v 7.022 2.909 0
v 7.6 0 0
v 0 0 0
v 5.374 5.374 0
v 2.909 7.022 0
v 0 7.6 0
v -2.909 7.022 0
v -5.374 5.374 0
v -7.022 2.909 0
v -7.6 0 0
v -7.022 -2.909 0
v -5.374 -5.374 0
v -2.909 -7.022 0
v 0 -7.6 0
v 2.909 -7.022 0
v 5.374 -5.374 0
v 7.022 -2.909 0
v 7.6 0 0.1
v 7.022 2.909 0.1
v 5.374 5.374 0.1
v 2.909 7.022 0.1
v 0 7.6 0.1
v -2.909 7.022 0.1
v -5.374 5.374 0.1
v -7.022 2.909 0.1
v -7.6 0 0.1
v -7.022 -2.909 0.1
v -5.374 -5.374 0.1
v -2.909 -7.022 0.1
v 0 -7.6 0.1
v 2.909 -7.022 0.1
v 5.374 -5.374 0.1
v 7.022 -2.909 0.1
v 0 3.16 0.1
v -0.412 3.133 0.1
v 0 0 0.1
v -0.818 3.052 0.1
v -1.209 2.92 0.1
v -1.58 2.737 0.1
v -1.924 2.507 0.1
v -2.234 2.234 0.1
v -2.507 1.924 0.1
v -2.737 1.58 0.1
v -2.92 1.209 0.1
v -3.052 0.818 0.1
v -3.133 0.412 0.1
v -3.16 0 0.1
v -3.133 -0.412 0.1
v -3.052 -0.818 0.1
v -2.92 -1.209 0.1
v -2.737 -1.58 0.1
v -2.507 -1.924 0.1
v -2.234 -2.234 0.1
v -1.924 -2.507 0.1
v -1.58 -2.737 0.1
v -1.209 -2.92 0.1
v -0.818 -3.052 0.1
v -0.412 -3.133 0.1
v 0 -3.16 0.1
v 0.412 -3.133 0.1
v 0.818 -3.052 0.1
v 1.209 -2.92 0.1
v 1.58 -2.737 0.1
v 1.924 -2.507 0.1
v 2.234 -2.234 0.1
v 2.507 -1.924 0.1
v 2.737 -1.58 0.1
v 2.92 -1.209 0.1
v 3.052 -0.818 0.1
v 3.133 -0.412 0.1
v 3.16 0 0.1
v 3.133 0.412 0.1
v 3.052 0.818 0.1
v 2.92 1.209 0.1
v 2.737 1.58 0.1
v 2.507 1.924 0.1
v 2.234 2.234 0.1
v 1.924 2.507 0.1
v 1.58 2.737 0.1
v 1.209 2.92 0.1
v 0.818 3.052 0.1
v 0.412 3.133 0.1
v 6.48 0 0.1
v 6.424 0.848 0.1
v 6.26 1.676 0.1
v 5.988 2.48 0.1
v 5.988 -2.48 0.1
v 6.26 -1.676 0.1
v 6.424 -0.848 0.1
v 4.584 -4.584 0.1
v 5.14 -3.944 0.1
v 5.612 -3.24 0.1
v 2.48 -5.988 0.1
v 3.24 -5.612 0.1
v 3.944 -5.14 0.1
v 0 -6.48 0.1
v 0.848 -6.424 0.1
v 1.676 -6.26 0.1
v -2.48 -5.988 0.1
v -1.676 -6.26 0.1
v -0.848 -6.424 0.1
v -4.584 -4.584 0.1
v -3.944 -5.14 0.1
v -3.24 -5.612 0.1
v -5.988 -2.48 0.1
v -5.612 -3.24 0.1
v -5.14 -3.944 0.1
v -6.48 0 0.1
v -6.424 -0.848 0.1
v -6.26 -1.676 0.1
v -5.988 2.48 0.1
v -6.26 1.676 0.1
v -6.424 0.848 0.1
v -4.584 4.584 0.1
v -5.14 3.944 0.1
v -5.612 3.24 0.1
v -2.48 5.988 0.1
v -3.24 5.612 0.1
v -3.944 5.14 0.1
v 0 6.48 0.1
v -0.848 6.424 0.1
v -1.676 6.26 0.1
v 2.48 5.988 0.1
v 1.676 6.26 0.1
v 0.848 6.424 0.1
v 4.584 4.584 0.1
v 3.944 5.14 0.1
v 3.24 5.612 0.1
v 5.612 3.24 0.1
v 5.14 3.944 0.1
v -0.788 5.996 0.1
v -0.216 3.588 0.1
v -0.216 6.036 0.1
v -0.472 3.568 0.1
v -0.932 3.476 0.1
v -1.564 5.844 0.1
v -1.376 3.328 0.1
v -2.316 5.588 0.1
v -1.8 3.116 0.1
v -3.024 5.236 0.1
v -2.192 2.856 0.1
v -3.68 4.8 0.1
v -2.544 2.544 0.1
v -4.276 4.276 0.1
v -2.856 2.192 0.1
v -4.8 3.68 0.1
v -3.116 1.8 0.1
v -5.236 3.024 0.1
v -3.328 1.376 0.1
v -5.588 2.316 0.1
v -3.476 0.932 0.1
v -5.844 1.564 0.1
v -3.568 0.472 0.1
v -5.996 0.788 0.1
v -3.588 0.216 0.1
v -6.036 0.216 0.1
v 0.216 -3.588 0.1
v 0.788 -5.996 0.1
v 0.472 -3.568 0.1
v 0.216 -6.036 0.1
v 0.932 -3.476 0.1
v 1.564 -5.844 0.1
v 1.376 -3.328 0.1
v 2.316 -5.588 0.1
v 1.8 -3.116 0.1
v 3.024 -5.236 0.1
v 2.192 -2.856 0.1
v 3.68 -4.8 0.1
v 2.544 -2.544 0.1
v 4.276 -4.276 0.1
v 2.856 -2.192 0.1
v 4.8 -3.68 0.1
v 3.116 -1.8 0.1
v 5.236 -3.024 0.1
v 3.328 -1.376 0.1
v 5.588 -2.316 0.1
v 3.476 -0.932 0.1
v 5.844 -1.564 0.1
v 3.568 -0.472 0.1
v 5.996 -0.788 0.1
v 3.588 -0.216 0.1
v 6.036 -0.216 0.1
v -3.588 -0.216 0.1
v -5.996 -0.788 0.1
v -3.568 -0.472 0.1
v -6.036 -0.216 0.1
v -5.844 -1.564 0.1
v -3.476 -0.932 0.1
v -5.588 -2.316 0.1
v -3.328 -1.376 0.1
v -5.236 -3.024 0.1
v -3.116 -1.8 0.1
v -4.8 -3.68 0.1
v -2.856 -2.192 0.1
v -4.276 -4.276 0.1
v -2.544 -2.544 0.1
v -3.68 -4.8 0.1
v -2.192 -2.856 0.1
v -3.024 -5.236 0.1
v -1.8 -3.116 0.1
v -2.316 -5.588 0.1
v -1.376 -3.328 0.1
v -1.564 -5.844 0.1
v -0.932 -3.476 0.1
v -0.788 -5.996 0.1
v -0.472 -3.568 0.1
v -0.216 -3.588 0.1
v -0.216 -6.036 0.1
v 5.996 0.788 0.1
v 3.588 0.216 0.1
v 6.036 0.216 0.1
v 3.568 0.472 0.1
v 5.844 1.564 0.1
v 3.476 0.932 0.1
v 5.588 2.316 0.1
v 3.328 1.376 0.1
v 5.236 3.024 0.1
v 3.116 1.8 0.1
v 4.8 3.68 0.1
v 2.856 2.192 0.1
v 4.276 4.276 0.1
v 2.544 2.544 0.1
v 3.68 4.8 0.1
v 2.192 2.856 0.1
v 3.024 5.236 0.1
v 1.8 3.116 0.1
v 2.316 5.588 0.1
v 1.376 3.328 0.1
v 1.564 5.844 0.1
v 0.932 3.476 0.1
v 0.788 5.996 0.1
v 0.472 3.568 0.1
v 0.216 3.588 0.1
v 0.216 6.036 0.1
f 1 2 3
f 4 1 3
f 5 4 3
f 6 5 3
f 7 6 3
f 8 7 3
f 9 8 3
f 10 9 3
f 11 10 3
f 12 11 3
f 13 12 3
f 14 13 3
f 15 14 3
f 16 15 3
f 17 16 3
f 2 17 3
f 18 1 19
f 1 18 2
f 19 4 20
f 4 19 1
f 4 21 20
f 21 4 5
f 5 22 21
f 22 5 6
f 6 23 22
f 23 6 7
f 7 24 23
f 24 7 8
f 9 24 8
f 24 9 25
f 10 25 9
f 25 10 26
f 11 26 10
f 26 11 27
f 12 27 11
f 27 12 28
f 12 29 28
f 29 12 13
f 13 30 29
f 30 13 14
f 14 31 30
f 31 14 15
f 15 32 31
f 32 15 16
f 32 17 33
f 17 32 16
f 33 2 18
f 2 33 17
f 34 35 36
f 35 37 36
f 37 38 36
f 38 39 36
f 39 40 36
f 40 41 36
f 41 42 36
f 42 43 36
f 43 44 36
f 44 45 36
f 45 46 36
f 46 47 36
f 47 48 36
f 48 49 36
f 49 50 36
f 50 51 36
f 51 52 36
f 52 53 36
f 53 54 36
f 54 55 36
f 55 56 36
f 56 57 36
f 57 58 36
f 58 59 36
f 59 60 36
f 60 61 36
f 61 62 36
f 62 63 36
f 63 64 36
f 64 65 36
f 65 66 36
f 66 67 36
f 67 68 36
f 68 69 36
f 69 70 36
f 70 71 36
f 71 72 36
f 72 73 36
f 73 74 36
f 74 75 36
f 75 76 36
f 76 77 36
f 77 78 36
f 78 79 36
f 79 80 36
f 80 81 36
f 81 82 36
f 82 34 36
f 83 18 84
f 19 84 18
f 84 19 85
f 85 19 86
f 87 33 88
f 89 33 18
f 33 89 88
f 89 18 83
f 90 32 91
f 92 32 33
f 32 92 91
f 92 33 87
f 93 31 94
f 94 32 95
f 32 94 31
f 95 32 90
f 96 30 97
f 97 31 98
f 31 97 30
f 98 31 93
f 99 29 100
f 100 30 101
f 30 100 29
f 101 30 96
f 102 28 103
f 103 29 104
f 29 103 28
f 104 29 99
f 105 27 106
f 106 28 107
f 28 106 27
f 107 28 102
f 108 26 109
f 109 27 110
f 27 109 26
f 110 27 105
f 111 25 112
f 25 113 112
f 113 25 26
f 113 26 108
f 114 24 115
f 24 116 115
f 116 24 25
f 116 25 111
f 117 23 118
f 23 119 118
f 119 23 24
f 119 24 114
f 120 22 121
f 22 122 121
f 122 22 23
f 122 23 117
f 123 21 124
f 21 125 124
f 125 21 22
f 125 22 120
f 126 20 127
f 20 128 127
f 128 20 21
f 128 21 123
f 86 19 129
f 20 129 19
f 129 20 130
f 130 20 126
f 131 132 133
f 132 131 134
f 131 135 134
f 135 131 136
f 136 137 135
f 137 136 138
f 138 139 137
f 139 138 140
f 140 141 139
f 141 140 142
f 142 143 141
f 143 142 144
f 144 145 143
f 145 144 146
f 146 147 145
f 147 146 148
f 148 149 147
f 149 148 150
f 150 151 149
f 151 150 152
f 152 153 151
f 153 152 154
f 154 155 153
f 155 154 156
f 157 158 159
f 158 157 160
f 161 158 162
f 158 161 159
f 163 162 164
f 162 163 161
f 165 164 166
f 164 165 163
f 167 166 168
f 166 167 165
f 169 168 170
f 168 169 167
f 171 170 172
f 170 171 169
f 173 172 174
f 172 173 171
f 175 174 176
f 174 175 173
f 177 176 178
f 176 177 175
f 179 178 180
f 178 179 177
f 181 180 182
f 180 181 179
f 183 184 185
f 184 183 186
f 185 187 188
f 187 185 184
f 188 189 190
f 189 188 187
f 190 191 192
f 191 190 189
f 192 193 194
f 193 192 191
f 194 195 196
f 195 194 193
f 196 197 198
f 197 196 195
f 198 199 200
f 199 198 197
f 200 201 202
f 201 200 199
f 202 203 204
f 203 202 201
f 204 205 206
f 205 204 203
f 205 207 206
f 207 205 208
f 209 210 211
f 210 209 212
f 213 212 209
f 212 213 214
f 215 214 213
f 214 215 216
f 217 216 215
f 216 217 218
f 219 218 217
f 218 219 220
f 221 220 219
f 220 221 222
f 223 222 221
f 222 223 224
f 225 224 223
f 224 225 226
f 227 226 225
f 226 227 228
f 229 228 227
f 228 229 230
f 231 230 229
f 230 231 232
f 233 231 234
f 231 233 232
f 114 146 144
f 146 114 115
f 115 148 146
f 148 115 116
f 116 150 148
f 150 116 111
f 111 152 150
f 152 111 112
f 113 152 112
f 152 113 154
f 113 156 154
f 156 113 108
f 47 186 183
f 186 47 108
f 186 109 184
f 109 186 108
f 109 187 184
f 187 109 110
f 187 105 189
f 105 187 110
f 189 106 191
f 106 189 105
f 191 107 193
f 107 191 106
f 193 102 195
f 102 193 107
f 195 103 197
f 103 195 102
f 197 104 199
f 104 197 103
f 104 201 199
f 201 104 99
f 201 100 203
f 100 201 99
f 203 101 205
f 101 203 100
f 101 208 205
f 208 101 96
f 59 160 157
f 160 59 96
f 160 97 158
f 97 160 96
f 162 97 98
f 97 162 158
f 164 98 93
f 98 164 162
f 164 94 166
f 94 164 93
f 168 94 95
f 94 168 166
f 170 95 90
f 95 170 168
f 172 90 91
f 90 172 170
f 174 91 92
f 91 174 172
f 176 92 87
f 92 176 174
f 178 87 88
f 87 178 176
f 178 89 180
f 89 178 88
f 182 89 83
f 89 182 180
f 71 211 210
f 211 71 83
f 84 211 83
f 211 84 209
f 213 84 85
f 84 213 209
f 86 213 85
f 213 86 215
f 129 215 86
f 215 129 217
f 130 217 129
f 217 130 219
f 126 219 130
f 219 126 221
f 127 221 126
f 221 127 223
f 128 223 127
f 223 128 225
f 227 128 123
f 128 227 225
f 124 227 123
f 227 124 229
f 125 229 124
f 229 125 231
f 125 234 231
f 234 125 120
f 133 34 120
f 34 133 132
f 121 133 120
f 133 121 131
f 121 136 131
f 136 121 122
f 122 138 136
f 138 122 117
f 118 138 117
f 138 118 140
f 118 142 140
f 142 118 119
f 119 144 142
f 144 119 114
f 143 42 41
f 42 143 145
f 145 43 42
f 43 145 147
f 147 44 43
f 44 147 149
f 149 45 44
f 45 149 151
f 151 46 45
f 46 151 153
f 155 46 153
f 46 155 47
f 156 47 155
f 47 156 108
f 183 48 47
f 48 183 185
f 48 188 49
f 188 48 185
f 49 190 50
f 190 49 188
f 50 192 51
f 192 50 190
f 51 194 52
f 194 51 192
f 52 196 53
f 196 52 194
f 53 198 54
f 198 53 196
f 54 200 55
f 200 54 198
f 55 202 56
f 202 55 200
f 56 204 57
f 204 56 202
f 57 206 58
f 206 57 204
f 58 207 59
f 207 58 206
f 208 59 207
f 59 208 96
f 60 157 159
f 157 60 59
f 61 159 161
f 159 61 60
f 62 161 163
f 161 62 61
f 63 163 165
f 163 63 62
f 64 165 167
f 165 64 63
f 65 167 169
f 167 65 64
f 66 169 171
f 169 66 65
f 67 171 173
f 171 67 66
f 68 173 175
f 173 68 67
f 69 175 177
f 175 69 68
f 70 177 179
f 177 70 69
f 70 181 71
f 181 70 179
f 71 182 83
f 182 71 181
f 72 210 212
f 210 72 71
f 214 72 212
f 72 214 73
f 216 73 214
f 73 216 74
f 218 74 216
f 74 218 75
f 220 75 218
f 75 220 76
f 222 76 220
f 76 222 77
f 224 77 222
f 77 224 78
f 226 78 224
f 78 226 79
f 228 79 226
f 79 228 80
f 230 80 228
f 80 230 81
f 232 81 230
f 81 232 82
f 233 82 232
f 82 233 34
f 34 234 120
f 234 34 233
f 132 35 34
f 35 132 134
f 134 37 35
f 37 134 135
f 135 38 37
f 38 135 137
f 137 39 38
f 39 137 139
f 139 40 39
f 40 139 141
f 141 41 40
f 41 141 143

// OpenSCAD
// file: ../p/empty.scad
use <../lib.scad>
function ldraw_lib__empty() = [
// 0 Empty
// 0 Name: empty.dat
// 0 Author: Steffen [Steffen]
// 0 !LDRAW_ORG Primitive UPDATE 2015-01
// 0 !LICENSE Licensed under CC BY 2.0 and CC BY 4.0 : see CAreadme.txt
// 
// 0 BFC CERTIFY CCW
  [0,"BFC","CERTIFY"],
  [0,"BFC","CCW"],
// 
// 0 !HISTORY 2015-10-11 [PTadmin] Official Update 2015-01
// 
// 
// 0 // Tool MLCad cannot handle really empty files. This file is used as a workaround.
// 0 // It exceptionally contains forbidden non-LDRAW standard syntax to satisfy MLCad until it is fixed OR a different editor has become the de-facto LDRAW standard.
// 0 // The line being used here is an "impossible" conditional line which never should be visible,
// 0 // additionally hidden by a syntax explicitly hiding it from displaying.
// 
// 0 MLCAD HIDE 5 24 0 0 0 0.0001 0 0 0.0001 -0.0001 0 0 0 0
];
makepoly(ldraw_lib__empty(), line=0.2);
// file: ../p/1-16chrd.scad
use <../lib.scad>
use <empty.scad>
function ldraw_lib__1_16chrd() = [
// 0 Chord 0.0625
// 0 Name: 1-16chrd.dat
// 0 Author: Philippe Hurbain [Philo]
// 0 !LDRAW_ORG Primitive UPDATE 2015-01
// 0 !LICENSE Licensed under CC BY 2.0 and CC BY 4.0 : see CAreadme.txt
// 
// 0 BFC CERTIFY CCW
  [0,"BFC","CERTIFY"],
  [0,"BFC","CCW"],
// 
// 0 !HISTORY 2015-10-11 [PTadmin] Official Update 2015-01
// 
// 
// 0 // This file is intentionally empty because at the current \P resolution,
// 0 // an 1-16chrd is actually empty. However, this file still is present
// 0 // to allow tools to do primitives substition and fill in a real chrd here,
// 0 // or, if desired, to substitute this with the hi-res 48\1-16chrd.
// 
// 0 // This file is based on an idea by Darats at http://forums.ldraw.org/read.php?19,14500,14500#msg-14500
// 
// 1 16 0 0 0 1 0 0 0 1 0 0 0 1 empty.dat
  [1,16,0,0,0,1,0,0,0,1,0,0,0,1, ldraw_lib__empty()],
];
makepoly(ldraw_lib__1_16chrd(), line=0.2);
// file: ../p/4-4disc.scad
use <../lib.scad>
function ldraw_lib__4_4disc() = [
// 0 Disc 1.0
// 0 Name: 4-4disc.dat
// 0 Author: James Jessiman
// 0 !LDRAW_ORG Primitive UPDATE 2002-02
// 0 !LICENSE Licensed under CC BY 2.0 and CC BY 4.0 : see CAreadme.txt
// 
// 0 BFC CERTIFY CCW
  [0,"BFC","CERTIFY"],
  [0,"BFC","CCW"],
// 
// 0 !HISTORY 1998-12-15 [PTadmin] Official Update 1998-10
// 0 !HISTORY 2002-03-23 [sbliss] Added BFC statement
// 0 !HISTORY 2002-04-25 [PTadmin] Official Update 2002-02
// 0 !HISTORY 2007-06-24 [PTadmin] Header formatted for Contributor Agreement
// 0 !HISTORY 2008-07-01 [PTadmin] Official Update 2008-01
// 
// 
// 3 16 0 0 0 1 0 0 0.9239 0 0.3827
  [3,16,0,0,0,1,0,0,0.9239,0,0.3827],
// 3 16 0 0 0 0.9239 0 0.3827 0.7071 0 0.7071
  [3,16,0,0,0,0.9239,0,0.3827,0.7071,0,0.7071],
// 3 16 0 0 0 0.7071 0 0.7071 0.3827 0 0.9239
  [3,16,0,0,0,0.7071,0,0.7071,0.3827,0,0.9239],
// 3 16 0 0 0 0.3827 0 0.9239 0 0 1
  [3,16,0,0,0,0.3827,0,0.9239,0,0,1],
// 3 16 0 0 0 0 0 1 -0.3827 0 0.9239
  [3,16,0,0,0,0,0,1,-0.3827,0,0.9239],
// 3 16 0 0 0 -0.3827 0 0.9239 -0.7071 0 0.7071
  [3,16,0,0,0,-0.3827,0,0.9239,-0.7071,0,0.7071],
// 3 16 0 0 0 -0.7071 0 0.7071 -0.9239 0 0.3827
  [3,16,0,0,0,-0.7071,0,0.7071,-0.9239,0,0.3827],
// 3 16 0 0 0 -0.9239 0 0.3827 -1 0 -0
  [3,16,0,0,0,-0.9239,0,0.3827,-1,0,-0],
// 3 16 0 0 0 -1 0 -0 -0.9239 0 -0.3827
  [3,16,0,0,0,-1,0,-0,-0.9239,0,-0.3827],
// 3 16 0 0 0 -0.9239 0 -0.3827 -0.7071 0 -0.7071
  [3,16,0,0,0,-0.9239,0,-0.3827,-0.7071,0,-0.7071],
// 3 16 0 0 0 -0.7071 0 -0.7071 -0.3827 0 -0.9239
  [3,16,0,0,0,-0.7071,0,-0.7071,-0.3827,0,-0.9239],
// 3 16 0 0 0 -0.3827 0 -0.9239 0 0 -1
  [3,16,0,0,0,-0.3827,0,-0.9239,0,0,-1],
// 3 16 0 0 0 0 0 -1 0.3827 0 -0.9239
  [3,16,0,0,0,0,0,-1,0.3827,0,-0.9239],
// 3 16 0 0 0 0.3827 0 -0.9239 0.7071 0 -0.7071
  [3,16,0,0,0,0.3827,0,-0.9239,0.7071,0,-0.7071],
// 3 16 0 0 0 0.7071 0 -0.7071 0.9239 0 -0.3827
  [3,16,0,0,0,0.7071,0,-0.7071,0.9239,0,-0.3827],
// 3 16 0 0 0 0.9239 0 -0.3827 1 0 0
  [3,16,0,0,0,0.9239,0,-0.3827,1,0,0],
// 0
];
makepoly(ldraw_lib__4_4disc(), line=0.2);
// file: ../p/4-4cyli.scad
use <../lib.scad>
function ldraw_lib__4_4cyli() = [
// 0 Cylinder 1.0
// 0 Name: 4-4cyli.dat
// 0 Author: James Jessiman
// 0 !LDRAW_ORG Primitive UPDATE 2005-01
// 0 !LICENSE Licensed under CC BY 2.0 and CC BY 4.0 : see CAreadme.txt
// 
// 0 BFC CERTIFY CCW
  [0,"BFC","CERTIFY"],
  [0,"BFC","CCW"],
// 
// 0 !HISTORY 1998-12-15 [PTadmin] Official Update 1998-10
// 0 !HISTORY 2002-03-23 [sbliss] Added BFC statement; merged headers from files in distributions LDraw 0.27 and Complete.
// 0 !HISTORY 2002-04-25 [PTadmin] Official Update 2002-02
// 0 !HISTORY 2004-12-14 [guyvivan] BFC CCW
// 0 !HISTORY 2005-12-28 [PTadmin] Official Update 2005-01
// 0 !HISTORY 2007-06-24 [PTadmin] Header formatted for Contributor Agreement
// 0 !HISTORY 2008-07-01 [PTadmin] Official Update 2008-01
// 
// 
// 4 16 1 1 0 0.9239 1 0.3827 0.9239 0 0.3827 1 0 0
  [4,16,1,1,0,0.9239,1,0.3827,0.9239,0,0.3827,1,0,0],
// 5 24 1 0 0 1 1 0 0.9239 0 0.3827 0.9239 0 -0.3827
  [5,24,1,0,0,1,1,0,0.9239,0,0.3827,0.9239,0,-0.3827],
// 4 16 0.9239 1 0.3827 0.7071 1 0.7071 0.7071 0 0.7071 0.9239 0 0.3827
  [4,16,0.9239,1,0.3827,0.7071,1,0.7071,0.7071,0,0.7071,0.9239,0,0.3827],
// 5 24 0.9239 0 0.3827 0.9239 1 0.3827 0.7071 0 0.7071 1 0 0
  [5,24,0.9239,0,0.3827,0.9239,1,0.3827,0.7071,0,0.7071,1,0,0],
// 4 16 0.7071 1 0.7071 0.3827 1 0.9239 0.3827 0 0.9239 0.7071 0 0.7071
  [4,16,0.7071,1,0.7071,0.3827,1,0.9239,0.3827,0,0.9239,0.7071,0,0.7071],
// 5 24 0.7071 0 0.7071 0.7071 1 0.7071 0.3827 0 0.9239 0.9239 0 0.3827
  [5,24,0.7071,0,0.7071,0.7071,1,0.7071,0.3827,0,0.9239,0.9239,0,0.3827],
// 4 16 0.3827 1 0.9239 0 1 1 0 0 1 0.3827 0 0.9239
  [4,16,0.3827,1,0.9239,0,1,1,0,0,1,0.3827,0,0.9239],
// 5 24 0.3827 0 0.9239 0.3827 1 0.9239 0 0 1 0.7071 0 0.7071
  [5,24,0.3827,0,0.9239,0.3827,1,0.9239,0,0,1,0.7071,0,0.7071],
// 4 16 0 1 1 -0.3827 1 0.9239 -0.3827 0 0.9239 0 0 1
  [4,16,0,1,1,-0.3827,1,0.9239,-0.3827,0,0.9239,0,0,1],
// 5 24 0 0 1 0 1 1 -0.3827 0 0.9239 0.3827 0 0.9239
  [5,24,0,0,1,0,1,1,-0.3827,0,0.9239,0.3827,0,0.9239],
// 4 16 -0.3827 1 0.9239 -0.7071 1 0.7071 -0.7071 0 0.7071 -0.3827 0 0.9239
  [4,16,-0.3827,1,0.9239,-0.7071,1,0.7071,-0.7071,0,0.7071,-0.3827,0,0.9239],
// 5 24 -0.3827 0 0.9239 -0.3827 1 0.9239 -0.7071 0 0.7071 0 0 1
  [5,24,-0.3827,0,0.9239,-0.3827,1,0.9239,-0.7071,0,0.7071,0,0,1],
// 4 16 -0.7071 1 0.7071 -0.9239 1 0.3827 -0.9239 0 0.3827 -0.7071 0 0.7071
  [4,16,-0.7071,1,0.7071,-0.9239,1,0.3827,-0.9239,0,0.3827,-0.7071,0,0.7071],
// 5 24 -0.7071 0 0.7071 -0.7071 1 0.7071 -0.9239 0 0.3827 -0.3827 0 0.9239
  [5,24,-0.7071,0,0.7071,-0.7071,1,0.7071,-0.9239,0,0.3827,-0.3827,0,0.9239],
// 4 16 -0.9239 1 0.3827 -1 1 0 -1 0 0 -0.9239 0 0.3827
  [4,16,-0.9239,1,0.3827,-1,1,0,-1,0,0,-0.9239,0,0.3827],
// 5 24 -0.9239 0 0.3827 -0.9239 1 0.3827 -1 0 0 -0.7071 0 0.7071
  [5,24,-0.9239,0,0.3827,-0.9239,1,0.3827,-1,0,0,-0.7071,0,0.7071],
// 4 16 -1 1 0 -0.9239 1 -0.3827 -0.9239 0 -0.3827 -1 0 0
  [4,16,-1,1,0,-0.9239,1,-0.3827,-0.9239,0,-0.3827,-1,0,0],
// 5 24 -1 0 0 -1 1 0 -0.9239 0 -0.3827 -0.9239 0 0.3827
  [5,24,-1,0,0,-1,1,0,-0.9239,0,-0.3827,-0.9239,0,0.3827],
// 4 16 -0.9239 1 -0.3827 -0.7071 1 -0.7071 -0.7071 0 -0.7071 -0.9239 0 -0.3827
  [4,16,-0.9239,1,-0.3827,-0.7071,1,-0.7071,-0.7071,0,-0.7071,-0.9239,0,-0.3827],
// 5 24 -0.9239 0 -0.3827 -0.9239 1 -0.3827 -0.7071 0 -0.7071 -1 0 0
  [5,24,-0.9239,0,-0.3827,-0.9239,1,-0.3827,-0.7071,0,-0.7071,-1,0,0],
// 4 16 -0.7071 1 -0.7071 -0.3827 1 -0.9239 -0.3827 0 -0.9239 -0.7071 0 -0.7071
  [4,16,-0.7071,1,-0.7071,-0.3827,1,-0.9239,-0.3827,0,-0.9239,-0.7071,0,-0.7071],
// 5 24 -0.7071 0 -0.7071 -0.7071 1 -0.7071 -0.3827 0 -0.9239 -0.9239 0 -0.3827
  [5,24,-0.7071,0,-0.7071,-0.7071,1,-0.7071,-0.3827,0,-0.9239,-0.9239,0,-0.3827],
// 4 16 -0.3827 1 -0.9239 0 1 -1 0 0 -1 -0.3827 0 -0.9239
  [4,16,-0.3827,1,-0.9239,0,1,-1,0,0,-1,-0.3827,0,-0.9239],
// 5 24 -0.3827 0 -0.9239 -0.3827 1 -0.9239 0 0 -1 -0.7071 0 -0.7071
  [5,24,-0.3827,0,-0.9239,-0.3827,1,-0.9239,0,0,-1,-0.7071,0,-0.7071],
// 4 16 0 1 -1 0.3827 1 -0.9239 0.3827 0 -0.9239 0 0 -1
  [4,16,0,1,-1,0.3827,1,-0.9239,0.3827,0,-0.9239,0,0,-1],
// 5 24 0 0 -1 0 1 -1 0.3827 0 -0.9239 -0.3827 0 -0.9239
  [5,24,0,0,-1,0,1,-1,0.3827,0,-0.9239,-0.3827,0,-0.9239],
// 4 16 0.3827 1 -0.9239 0.7071 1 -0.7071 0.7071 0 -0.7071 0.3827 0 -0.9239
  [4,16,0.3827,1,-0.9239,0.7071,1,-0.7071,0.7071,0,-0.7071,0.3827,0,-0.9239],
// 5 24 0.3827 0 -0.9239 0.3827 1 -0.9239 0.7071 0 -0.7071 0 0 -1
  [5,24,0.3827,0,-0.9239,0.3827,1,-0.9239,0.7071,0,-0.7071,0,0,-1],
// 4 16 0.7071 1 -0.7071 0.9239 1 -0.3827 0.9239 0 -0.3827 0.7071 0 -0.7071
  [4,16,0.7071,1,-0.7071,0.9239,1,-0.3827,0.9239,0,-0.3827,0.7071,0,-0.7071],
// 5 24 0.7071 0 -0.7071 0.7071 1 -0.7071 0.9239 0 -0.3827 0.3827 0 -0.9239
  [5,24,0.7071,0,-0.7071,0.7071,1,-0.7071,0.9239,0,-0.3827,0.3827,0,-0.9239],
// 4 16 0.9239 1 -0.3827 1 1 0 1 0 0 0.9239 0 -0.3827
  [4,16,0.9239,1,-0.3827,1,1,0,1,0,0,0.9239,0,-0.3827],
// 5 24 0.9239 0 -0.3827 0.9239 1 -0.3827 1 0 0 0.7071 0 -0.7071
  [5,24,0.9239,0,-0.3827,0.9239,1,-0.3827,1,0,0,0.7071,0,-0.7071],
// 0
];
makepoly(ldraw_lib__4_4cyli(), line=0.2);
// file: ../p/48/4-4disc.scad
use <../../lib.scad>
function ldraw_lib__48__4_4disc() = [
// 0 Hi-Res Disc 1.0
// 0 Name: 48\4-4disc.dat
// 0 Author: Miklos Hosszu [hmick]
// 0 !LDRAW_ORG 48_Primitive UPDATE 2012-02
// 0 !LICENSE Licensed under CC BY 2.0 and CC BY 4.0 : see CAreadme.txt
// 
// 0 BFC CERTIFY CCW
  [0,"BFC","CERTIFY"],
  [0,"BFC","CCW"],
// 
// 0 !HISTORY 2004-11-06 [PTadmin] Official Update 2004-04
// 0 !HISTORY 2007-06-24 [PTadmin] Header formatted for Contributor Agreement
// 0 !HISTORY 2008-07-01 [PTadmin] Official Update 2008-01
// 0 !HISTORY 2012-02-27 [Philo] Changed to CCW
// 0 !HISTORY 2012-08-09 [PTadmin] Official Update 2012-02
// 
// 
// 3 16 1 0 0 0.9914 0 0.1305 0 0 0
  [3,16,1,0,0,0.9914,0,0.1305,0,0,0],
// 3 16 0.9914 0 0.1305 0.9659 0 0.2588 0 0 0
  [3,16,0.9914,0,0.1305,0.9659,0,0.2588,0,0,0],
// 3 16 0.9659 0 0.2588 0.9239 0 0.3827 0 0 0
  [3,16,0.9659,0,0.2588,0.9239,0,0.3827,0,0,0],
// 3 16 0.9239 0 0.3827 0.866 0 0.5 0 0 0
  [3,16,0.9239,0,0.3827,0.866,0,0.5,0,0,0],
// 3 16 0.866 0 0.5 0.7934 0 0.6088 0 0 0
  [3,16,0.866,0,0.5,0.7934,0,0.6088,0,0,0],
// 3 16 0.7934 0 0.6088 0.7071 0 0.7071 0 0 0
  [3,16,0.7934,0,0.6088,0.7071,0,0.7071,0,0,0],
// 3 16 0.7071 0 0.7071 0.6088 0 0.7934 0 0 0
  [3,16,0.7071,0,0.7071,0.6088,0,0.7934,0,0,0],
// 3 16 0.6088 0 0.7934 0.5 0 0.866 0 0 0
  [3,16,0.6088,0,0.7934,0.5,0,0.866,0,0,0],
// 3 16 0.5 0 0.866 0.3827 0 0.9239 0 0 0
  [3,16,0.5,0,0.866,0.3827,0,0.9239,0,0,0],
// 3 16 0.3827 0 0.9239 0.2588 0 0.9659 0 0 0
  [3,16,0.3827,0,0.9239,0.2588,0,0.9659,0,0,0],
// 3 16 0.2588 0 0.9659 0.1305 0 0.9914 0 0 0
  [3,16,0.2588,0,0.9659,0.1305,0,0.9914,0,0,0],
// 3 16 0.1305 0 0.9914 0 0 1 0 0 0
  [3,16,0.1305,0,0.9914,0,0,1,0,0,0],
// 3 16 0 0 1 -0.1305 0 0.9914 0 0 0
  [3,16,0,0,1,-0.1305,0,0.9914,0,0,0],
// 3 16 -0.1305 0 0.9914 -0.2588 0 0.9659 0 0 0
  [3,16,-0.1305,0,0.9914,-0.2588,0,0.9659,0,0,0],
// 3 16 -0.2588 0 0.9659 -0.3827 0 0.9239 0 0 0
  [3,16,-0.2588,0,0.9659,-0.3827,0,0.9239,0,0,0],
// 3 16 -0.3827 0 0.9239 -0.5 0 0.866 0 0 0
  [3,16,-0.3827,0,0.9239,-0.5,0,0.866,0,0,0],
// 3 16 -0.5 0 0.866 -0.6088 0 0.7934 0 0 0
  [3,16,-0.5,0,0.866,-0.6088,0,0.7934,0,0,0],
// 3 16 -0.6088 0 0.7934 -0.7071 0 0.7071 0 0 0
  [3,16,-0.6088,0,0.7934,-0.7071,0,0.7071,0,0,0],
// 3 16 -0.7071 0 0.7071 -0.7934 0 0.6088 0 0 0
  [3,16,-0.7071,0,0.7071,-0.7934,0,0.6088,0,0,0],
// 3 16 -0.7934 0 0.6088 -0.866 0 0.5 0 0 0
  [3,16,-0.7934,0,0.6088,-0.866,0,0.5,0,0,0],
// 3 16 -0.866 0 0.5 -0.9239 0 0.3827 0 0 0
  [3,16,-0.866,0,0.5,-0.9239,0,0.3827,0,0,0],
// 3 16 -0.9239 0 0.3827 -0.9659 0 0.2588 0 0 0
  [3,16,-0.9239,0,0.3827,-0.9659,0,0.2588,0,0,0],
// 3 16 -0.9659 0 0.2588 -0.9914 0 0.1305 0 0 0
  [3,16,-0.9659,0,0.2588,-0.9914,0,0.1305,0,0,0],
// 3 16 -0.9914 0 0.1305 -1 0 0 0 0 0
  [3,16,-0.9914,0,0.1305,-1,0,0,0,0,0],
// 3 16 -1 0 0 -0.9914 0 -0.1305 0 0 0
  [3,16,-1,0,0,-0.9914,0,-0.1305,0,0,0],
// 3 16 -0.9914 0 -0.1305 -0.9659 0 -0.2588 0 0 0
  [3,16,-0.9914,0,-0.1305,-0.9659,0,-0.2588,0,0,0],
// 3 16 -0.9659 0 -0.2588 -0.9239 0 -0.3827 0 0 0
  [3,16,-0.9659,0,-0.2588,-0.9239,0,-0.3827,0,0,0],
// 3 16 -0.9239 0 -0.3827 -0.866 0 -0.5 0 0 0
  [3,16,-0.9239,0,-0.3827,-0.866,0,-0.5,0,0,0],
// 3 16 -0.866 0 -0.5 -0.7934 0 -0.6088 0 0 0
  [3,16,-0.866,0,-0.5,-0.7934,0,-0.6088,0,0,0],
// 3 16 -0.7934 0 -0.6088 -0.7071 0 -0.7071 0 0 0
  [3,16,-0.7934,0,-0.6088,-0.7071,0,-0.7071,0,0,0],
// 3 16 -0.7071 0 -0.7071 -0.6088 0 -0.7934 0 0 0
  [3,16,-0.7071,0,-0.7071,-0.6088,0,-0.7934,0,0,0],
// 3 16 -0.6088 0 -0.7934 -0.5 0 -0.866 0 0 0
  [3,16,-0.6088,0,-0.7934,-0.5,0,-0.866,0,0,0],
// 3 16 -0.5 0 -0.866 -0.3827 0 -0.9239 0 0 0
  [3,16,-0.5,0,-0.866,-0.3827,0,-0.9239,0,0,0],
// 3 16 -0.3827 0 -0.9239 -0.2588 0 -0.9659 0 0 0
  [3,16,-0.3827,0,-0.9239,-0.2588,0,-0.9659,0,0,0],
// 3 16 -0.2588 0 -0.9659 -0.1305 0 -0.9914 0 0 0
  [3,16,-0.2588,0,-0.9659,-0.1305,0,-0.9914,0,0,0],
// 3 16 -0.1305 0 -0.9914 0 0 -1 0 0 0
  [3,16,-0.1305,0,-0.9914,0,0,-1,0,0,0],
// 3 16 0 0 -1 0.1305 0 -0.9914 0 0 0
  [3,16,0,0,-1,0.1305,0,-0.9914,0,0,0],
// 3 16 0.1305 0 -0.9914 0.2588 0 -0.9659 0 0 0
  [3,16,0.1305,0,-0.9914,0.2588,0,-0.9659,0,0,0],
// 3 16 0.2588 0 -0.9659 0.3827 0 -0.9239 0 0 0
  [3,16,0.2588,0,-0.9659,0.3827,0,-0.9239,0,0,0],
// 3 16 0.3827 0 -0.9239 0.5 0 -0.866 0 0 0
  [3,16,0.3827,0,-0.9239,0.5,0,-0.866,0,0,0],
// 3 16 0.5 0 -0.866 0.6088 0 -0.7934 0 0 0
  [3,16,0.5,0,-0.866,0.6088,0,-0.7934,0,0,0],
// 3 16 0.6088 0 -0.7934 0.7071 0 -0.7071 0 0 0
  [3,16,0.6088,0,-0.7934,0.7071,0,-0.7071,0,0,0],
// 3 16 0.7071 0 -0.7071 0.7934 0 -0.6088 0 0 0
  [3,16,0.7071,0,-0.7071,0.7934,0,-0.6088,0,0,0],
// 3 16 0.7934 0 -0.6088 0.866 0 -0.5 0 0 0
  [3,16,0.7934,0,-0.6088,0.866,0,-0.5,0,0,0],
// 3 16 0.866 0 -0.5 0.9239 0 -0.3827 0 0 0
  [3,16,0.866,0,-0.5,0.9239,0,-0.3827,0,0,0],
// 3 16 0.9239 0 -0.3827 0.9659 0 -0.2588 0 0 0
  [3,16,0.9239,0,-0.3827,0.9659,0,-0.2588,0,0,0],
// 3 16 0.9659 0 -0.2588 0.9914 0 -0.1305 0 0 0
  [3,16,0.9659,0,-0.2588,0.9914,0,-0.1305,0,0,0],
// 3 16 0.9914 0 -0.1305 1 0 0 0 0 0
  [3,16,0.9914,0,-0.1305,1,0,0,0,0,0],
];
makepoly(ldraw_lib__48__4_4disc(), line=0.2);
// file: ../p/4-4ering.scad
use <../lib.scad>
use <1-16chrd.scad>
function ldraw_lib__4_4ering() = [
// 0 Adapter Ring Triangles to Normal 1.0
// 0 Name: 4-4ering.dat
// 0 Author: Philippe Hurbain [Philo]
// 0 !LDRAW_ORG Primitive UPDATE 2015-01
// 0 !LICENSE Licensed under CC BY 2.0 and CC BY 4.0 : see CAreadme.txt
// 
// 0 BFC CERTIFY CCW
  [0,"BFC","CERTIFY"],
  [0,"BFC","CCW"],
// 
// 0 !HISTORY 2015-10-11 [PTadmin] Official Update 2015-01
// 
// 
// 0 // This file uses 1-16chrd (actually empty). It allows
// 0 // tools to do primitives substition and fill in a ring of chrd here,
// 0 // or, if desired, to substitute this with the hi-res 48\1-16chrd.
// 0 // This file is based on an idea by Darats at http://forums.ldraw.org/read.php?19,14500,14500#msg-14500
// 
// 1 16 0 0 0 1 0 0 0 1 0 0 0 1 1-16chrd.dat
  [1,16,0,0,0,1,0,0,0,1,0,0,0,1, ldraw_lib__1_16chrd()],
// 1 16 0 0 0 0.92388 0 0.38268 0 1 0 -0.38268 0 0.92388 1-16chrd.dat
  [1,16,0,0,0,0.92388,0,0.38268,0,1,0,-0.38268,0,0.92388, ldraw_lib__1_16chrd()],
// 1 16 0 0 0 0.70711 0 0.70711 0 1 0 -0.70711 0 0.70711 1-16chrd.dat
  [1,16,0,0,0,0.70711,0,0.70711,0,1,0,-0.70711,0,0.70711, ldraw_lib__1_16chrd()],
// 1 16 0 0 0 0.38268 0 0.92388 0 1 0 -0.92388 0 0.38268 1-16chrd.dat
  [1,16,0,0,0,0.38268,0,0.92388,0,1,0,-0.92388,0,0.38268, ldraw_lib__1_16chrd()],
// 1 16 0 0 0 0 0 1 0 1 0 -1 0 0 1-16chrd.dat
  [1,16,0,0,0,0,0,1,0,1,0,-1,0,0, ldraw_lib__1_16chrd()],
// 1 16 0 0 0 -0.38268 0 0.92388 0 1 0 -0.92388 0 -0.38268 1-16chrd.dat
  [1,16,0,0,0,-0.38268,0,0.92388,0,1,0,-0.92388,0,-0.38268, ldraw_lib__1_16chrd()],
// 1 16 0 0 0 -0.70711 0 0.70711 0 1 0 -0.70711 0 -0.70711 1-16chrd.dat
  [1,16,0,0,0,-0.70711,0,0.70711,0,1,0,-0.70711,0,-0.70711, ldraw_lib__1_16chrd()],
// 1 16 0 0 0 -0.92388 0 0.38268 0 1 0 -0.38268 0 -0.92388 1-16chrd.dat
  [1,16,0,0,0,-0.92388,0,0.38268,0,1,0,-0.38268,0,-0.92388, ldraw_lib__1_16chrd()],
// 1 16 0 0 0 0 0 -1 0 1 0 1 0 0 1-16chrd.dat
  [1,16,0,0,0,0,0,-1,0,1,0,1,0,0, ldraw_lib__1_16chrd()],
// 1 16 0 0 0 0.38268 0 -0.92388 0 1 0 0.92388 0 0.38268 1-16chrd.dat
  [1,16,0,0,0,0.38268,0,-0.92388,0,1,0,0.92388,0,0.38268, ldraw_lib__1_16chrd()],
// 1 16 0 0 0 0.70711 0 -0.70711 0 1 0 0.70711 0 0.70711 1-16chrd.dat
  [1,16,0,0,0,0.70711,0,-0.70711,0,1,0,0.70711,0,0.70711, ldraw_lib__1_16chrd()],
// 1 16 0 0 0 0.92388 0 -0.38268 0 1 0 0.38268 0 0.92388 1-16chrd.dat
  [1,16,0,0,0,0.92388,0,-0.38268,0,1,0,0.38268,0,0.92388, ldraw_lib__1_16chrd()],
// 1 16 0 0 0 -1 0 0 0 1 0 0 0 -1 1-16chrd.dat
  [1,16,0,0,0,-1,0,0,0,1,0,0,0,-1, ldraw_lib__1_16chrd()],
// 1 16 0 0 0 -0.92388 0 -0.38268 0 1 0 0.38268 0 -0.92388 1-16chrd.dat
  [1,16,0,0,0,-0.92388,0,-0.38268,0,1,0,0.38268,0,-0.92388, ldraw_lib__1_16chrd()],
// 1 16 0 0 0 -0.70711 0 -0.70711 0 1 0 0.70711 0 -0.70711 1-16chrd.dat
  [1,16,0,0,0,-0.70711,0,-0.70711,0,1,0,0.70711,0,-0.70711, ldraw_lib__1_16chrd()],
// 1 16 0 0 0 -0.38268 0 -0.92388 0 1 0 0.92388 0 -0.38268 1-16chrd.dat
  [1,16,0,0,0,-0.38268,0,-0.92388,0,1,0,0.92388,0,-0.38268, ldraw_lib__1_16chrd()],
];
makepoly(ldraw_lib__4_4ering(), line=0.2);
// file: ../p/4-4cylc3.scad
use <../lib.scad>
use <4-4cyli.scad>
use <4-4disc.scad>
function ldraw_lib__4_4cylc3() = [
// 0 Cylinder Closed 1.0 without Top or Bottom Edge Lines
// 0 Name: 4-4cylc3.dat
// 0 Author: Chris Dee [cwdee]
// 0 !LDRAW_ORG Primitive UPDATE 2017-01
// 0 !LICENSE Licensed under CC BY 2.0 and CC BY 4.0 : see CAreadme.txt
// 
// 0 BFC CERTIFY CCW
  [0,"BFC","CERTIFY"],
  [0,"BFC","CCW"],
// 
// 0 !HISTORY 2017-12-30 [PTadmin] Official Update 2017-01
// 
// 
// 1 16 0 0 0 1 0 0 0 1 0 0 0 1 4-4disc.dat
  [1,16,0,0,0,1,0,0,0,1,0,0,0,1, ldraw_lib__4_4disc()],
// 1 16 0 0 0 1 0 0 0 1 0 0 0 1 4-4cyli.dat
  [1,16,0,0,0,1,0,0,0,1,0,0,0,1, ldraw_lib__4_4cyli()],
// 0
];
makepoly(ldraw_lib__4_4cylc3(), line=0.2);
// main file
use <../lib.scad>
use <820671a.scad>
function ldraw_lib__820672a() = [
// 0 =Sticker  1.9 x  1.9 Round with Lifepreserver
// 0 Name: 820672a.dat
// 0 Author: [PTadmin]
// 0 !LDRAW_ORG Part Alias UPDATE 2022-04
// 0 !LICENSE Licensed under CC BY 4.0 : see CAreadme.txt
// 
// 0 BFC CERTIFY CCW
  [0,"BFC","CERTIFY"],
  [0,"BFC","CCW"],
// 
// 0 !KEYWORDS Intercoastal Seaport, Set 6541
// 
// 0 !HISTORY 2022-07-18 [PTadmin] Official Update 2022-04
// 
// 
// 0 // Alias of 820671a
// 1 16 0 0 0 1 0 0 0 1 0 0 0 1 820671a.dat
  [1,16,0,0,0,1,0,0,0,1,0,0,0,1, ldraw_lib__820671a()],
];
makepoly(ldraw_lib__820672a(), line=0.2);
